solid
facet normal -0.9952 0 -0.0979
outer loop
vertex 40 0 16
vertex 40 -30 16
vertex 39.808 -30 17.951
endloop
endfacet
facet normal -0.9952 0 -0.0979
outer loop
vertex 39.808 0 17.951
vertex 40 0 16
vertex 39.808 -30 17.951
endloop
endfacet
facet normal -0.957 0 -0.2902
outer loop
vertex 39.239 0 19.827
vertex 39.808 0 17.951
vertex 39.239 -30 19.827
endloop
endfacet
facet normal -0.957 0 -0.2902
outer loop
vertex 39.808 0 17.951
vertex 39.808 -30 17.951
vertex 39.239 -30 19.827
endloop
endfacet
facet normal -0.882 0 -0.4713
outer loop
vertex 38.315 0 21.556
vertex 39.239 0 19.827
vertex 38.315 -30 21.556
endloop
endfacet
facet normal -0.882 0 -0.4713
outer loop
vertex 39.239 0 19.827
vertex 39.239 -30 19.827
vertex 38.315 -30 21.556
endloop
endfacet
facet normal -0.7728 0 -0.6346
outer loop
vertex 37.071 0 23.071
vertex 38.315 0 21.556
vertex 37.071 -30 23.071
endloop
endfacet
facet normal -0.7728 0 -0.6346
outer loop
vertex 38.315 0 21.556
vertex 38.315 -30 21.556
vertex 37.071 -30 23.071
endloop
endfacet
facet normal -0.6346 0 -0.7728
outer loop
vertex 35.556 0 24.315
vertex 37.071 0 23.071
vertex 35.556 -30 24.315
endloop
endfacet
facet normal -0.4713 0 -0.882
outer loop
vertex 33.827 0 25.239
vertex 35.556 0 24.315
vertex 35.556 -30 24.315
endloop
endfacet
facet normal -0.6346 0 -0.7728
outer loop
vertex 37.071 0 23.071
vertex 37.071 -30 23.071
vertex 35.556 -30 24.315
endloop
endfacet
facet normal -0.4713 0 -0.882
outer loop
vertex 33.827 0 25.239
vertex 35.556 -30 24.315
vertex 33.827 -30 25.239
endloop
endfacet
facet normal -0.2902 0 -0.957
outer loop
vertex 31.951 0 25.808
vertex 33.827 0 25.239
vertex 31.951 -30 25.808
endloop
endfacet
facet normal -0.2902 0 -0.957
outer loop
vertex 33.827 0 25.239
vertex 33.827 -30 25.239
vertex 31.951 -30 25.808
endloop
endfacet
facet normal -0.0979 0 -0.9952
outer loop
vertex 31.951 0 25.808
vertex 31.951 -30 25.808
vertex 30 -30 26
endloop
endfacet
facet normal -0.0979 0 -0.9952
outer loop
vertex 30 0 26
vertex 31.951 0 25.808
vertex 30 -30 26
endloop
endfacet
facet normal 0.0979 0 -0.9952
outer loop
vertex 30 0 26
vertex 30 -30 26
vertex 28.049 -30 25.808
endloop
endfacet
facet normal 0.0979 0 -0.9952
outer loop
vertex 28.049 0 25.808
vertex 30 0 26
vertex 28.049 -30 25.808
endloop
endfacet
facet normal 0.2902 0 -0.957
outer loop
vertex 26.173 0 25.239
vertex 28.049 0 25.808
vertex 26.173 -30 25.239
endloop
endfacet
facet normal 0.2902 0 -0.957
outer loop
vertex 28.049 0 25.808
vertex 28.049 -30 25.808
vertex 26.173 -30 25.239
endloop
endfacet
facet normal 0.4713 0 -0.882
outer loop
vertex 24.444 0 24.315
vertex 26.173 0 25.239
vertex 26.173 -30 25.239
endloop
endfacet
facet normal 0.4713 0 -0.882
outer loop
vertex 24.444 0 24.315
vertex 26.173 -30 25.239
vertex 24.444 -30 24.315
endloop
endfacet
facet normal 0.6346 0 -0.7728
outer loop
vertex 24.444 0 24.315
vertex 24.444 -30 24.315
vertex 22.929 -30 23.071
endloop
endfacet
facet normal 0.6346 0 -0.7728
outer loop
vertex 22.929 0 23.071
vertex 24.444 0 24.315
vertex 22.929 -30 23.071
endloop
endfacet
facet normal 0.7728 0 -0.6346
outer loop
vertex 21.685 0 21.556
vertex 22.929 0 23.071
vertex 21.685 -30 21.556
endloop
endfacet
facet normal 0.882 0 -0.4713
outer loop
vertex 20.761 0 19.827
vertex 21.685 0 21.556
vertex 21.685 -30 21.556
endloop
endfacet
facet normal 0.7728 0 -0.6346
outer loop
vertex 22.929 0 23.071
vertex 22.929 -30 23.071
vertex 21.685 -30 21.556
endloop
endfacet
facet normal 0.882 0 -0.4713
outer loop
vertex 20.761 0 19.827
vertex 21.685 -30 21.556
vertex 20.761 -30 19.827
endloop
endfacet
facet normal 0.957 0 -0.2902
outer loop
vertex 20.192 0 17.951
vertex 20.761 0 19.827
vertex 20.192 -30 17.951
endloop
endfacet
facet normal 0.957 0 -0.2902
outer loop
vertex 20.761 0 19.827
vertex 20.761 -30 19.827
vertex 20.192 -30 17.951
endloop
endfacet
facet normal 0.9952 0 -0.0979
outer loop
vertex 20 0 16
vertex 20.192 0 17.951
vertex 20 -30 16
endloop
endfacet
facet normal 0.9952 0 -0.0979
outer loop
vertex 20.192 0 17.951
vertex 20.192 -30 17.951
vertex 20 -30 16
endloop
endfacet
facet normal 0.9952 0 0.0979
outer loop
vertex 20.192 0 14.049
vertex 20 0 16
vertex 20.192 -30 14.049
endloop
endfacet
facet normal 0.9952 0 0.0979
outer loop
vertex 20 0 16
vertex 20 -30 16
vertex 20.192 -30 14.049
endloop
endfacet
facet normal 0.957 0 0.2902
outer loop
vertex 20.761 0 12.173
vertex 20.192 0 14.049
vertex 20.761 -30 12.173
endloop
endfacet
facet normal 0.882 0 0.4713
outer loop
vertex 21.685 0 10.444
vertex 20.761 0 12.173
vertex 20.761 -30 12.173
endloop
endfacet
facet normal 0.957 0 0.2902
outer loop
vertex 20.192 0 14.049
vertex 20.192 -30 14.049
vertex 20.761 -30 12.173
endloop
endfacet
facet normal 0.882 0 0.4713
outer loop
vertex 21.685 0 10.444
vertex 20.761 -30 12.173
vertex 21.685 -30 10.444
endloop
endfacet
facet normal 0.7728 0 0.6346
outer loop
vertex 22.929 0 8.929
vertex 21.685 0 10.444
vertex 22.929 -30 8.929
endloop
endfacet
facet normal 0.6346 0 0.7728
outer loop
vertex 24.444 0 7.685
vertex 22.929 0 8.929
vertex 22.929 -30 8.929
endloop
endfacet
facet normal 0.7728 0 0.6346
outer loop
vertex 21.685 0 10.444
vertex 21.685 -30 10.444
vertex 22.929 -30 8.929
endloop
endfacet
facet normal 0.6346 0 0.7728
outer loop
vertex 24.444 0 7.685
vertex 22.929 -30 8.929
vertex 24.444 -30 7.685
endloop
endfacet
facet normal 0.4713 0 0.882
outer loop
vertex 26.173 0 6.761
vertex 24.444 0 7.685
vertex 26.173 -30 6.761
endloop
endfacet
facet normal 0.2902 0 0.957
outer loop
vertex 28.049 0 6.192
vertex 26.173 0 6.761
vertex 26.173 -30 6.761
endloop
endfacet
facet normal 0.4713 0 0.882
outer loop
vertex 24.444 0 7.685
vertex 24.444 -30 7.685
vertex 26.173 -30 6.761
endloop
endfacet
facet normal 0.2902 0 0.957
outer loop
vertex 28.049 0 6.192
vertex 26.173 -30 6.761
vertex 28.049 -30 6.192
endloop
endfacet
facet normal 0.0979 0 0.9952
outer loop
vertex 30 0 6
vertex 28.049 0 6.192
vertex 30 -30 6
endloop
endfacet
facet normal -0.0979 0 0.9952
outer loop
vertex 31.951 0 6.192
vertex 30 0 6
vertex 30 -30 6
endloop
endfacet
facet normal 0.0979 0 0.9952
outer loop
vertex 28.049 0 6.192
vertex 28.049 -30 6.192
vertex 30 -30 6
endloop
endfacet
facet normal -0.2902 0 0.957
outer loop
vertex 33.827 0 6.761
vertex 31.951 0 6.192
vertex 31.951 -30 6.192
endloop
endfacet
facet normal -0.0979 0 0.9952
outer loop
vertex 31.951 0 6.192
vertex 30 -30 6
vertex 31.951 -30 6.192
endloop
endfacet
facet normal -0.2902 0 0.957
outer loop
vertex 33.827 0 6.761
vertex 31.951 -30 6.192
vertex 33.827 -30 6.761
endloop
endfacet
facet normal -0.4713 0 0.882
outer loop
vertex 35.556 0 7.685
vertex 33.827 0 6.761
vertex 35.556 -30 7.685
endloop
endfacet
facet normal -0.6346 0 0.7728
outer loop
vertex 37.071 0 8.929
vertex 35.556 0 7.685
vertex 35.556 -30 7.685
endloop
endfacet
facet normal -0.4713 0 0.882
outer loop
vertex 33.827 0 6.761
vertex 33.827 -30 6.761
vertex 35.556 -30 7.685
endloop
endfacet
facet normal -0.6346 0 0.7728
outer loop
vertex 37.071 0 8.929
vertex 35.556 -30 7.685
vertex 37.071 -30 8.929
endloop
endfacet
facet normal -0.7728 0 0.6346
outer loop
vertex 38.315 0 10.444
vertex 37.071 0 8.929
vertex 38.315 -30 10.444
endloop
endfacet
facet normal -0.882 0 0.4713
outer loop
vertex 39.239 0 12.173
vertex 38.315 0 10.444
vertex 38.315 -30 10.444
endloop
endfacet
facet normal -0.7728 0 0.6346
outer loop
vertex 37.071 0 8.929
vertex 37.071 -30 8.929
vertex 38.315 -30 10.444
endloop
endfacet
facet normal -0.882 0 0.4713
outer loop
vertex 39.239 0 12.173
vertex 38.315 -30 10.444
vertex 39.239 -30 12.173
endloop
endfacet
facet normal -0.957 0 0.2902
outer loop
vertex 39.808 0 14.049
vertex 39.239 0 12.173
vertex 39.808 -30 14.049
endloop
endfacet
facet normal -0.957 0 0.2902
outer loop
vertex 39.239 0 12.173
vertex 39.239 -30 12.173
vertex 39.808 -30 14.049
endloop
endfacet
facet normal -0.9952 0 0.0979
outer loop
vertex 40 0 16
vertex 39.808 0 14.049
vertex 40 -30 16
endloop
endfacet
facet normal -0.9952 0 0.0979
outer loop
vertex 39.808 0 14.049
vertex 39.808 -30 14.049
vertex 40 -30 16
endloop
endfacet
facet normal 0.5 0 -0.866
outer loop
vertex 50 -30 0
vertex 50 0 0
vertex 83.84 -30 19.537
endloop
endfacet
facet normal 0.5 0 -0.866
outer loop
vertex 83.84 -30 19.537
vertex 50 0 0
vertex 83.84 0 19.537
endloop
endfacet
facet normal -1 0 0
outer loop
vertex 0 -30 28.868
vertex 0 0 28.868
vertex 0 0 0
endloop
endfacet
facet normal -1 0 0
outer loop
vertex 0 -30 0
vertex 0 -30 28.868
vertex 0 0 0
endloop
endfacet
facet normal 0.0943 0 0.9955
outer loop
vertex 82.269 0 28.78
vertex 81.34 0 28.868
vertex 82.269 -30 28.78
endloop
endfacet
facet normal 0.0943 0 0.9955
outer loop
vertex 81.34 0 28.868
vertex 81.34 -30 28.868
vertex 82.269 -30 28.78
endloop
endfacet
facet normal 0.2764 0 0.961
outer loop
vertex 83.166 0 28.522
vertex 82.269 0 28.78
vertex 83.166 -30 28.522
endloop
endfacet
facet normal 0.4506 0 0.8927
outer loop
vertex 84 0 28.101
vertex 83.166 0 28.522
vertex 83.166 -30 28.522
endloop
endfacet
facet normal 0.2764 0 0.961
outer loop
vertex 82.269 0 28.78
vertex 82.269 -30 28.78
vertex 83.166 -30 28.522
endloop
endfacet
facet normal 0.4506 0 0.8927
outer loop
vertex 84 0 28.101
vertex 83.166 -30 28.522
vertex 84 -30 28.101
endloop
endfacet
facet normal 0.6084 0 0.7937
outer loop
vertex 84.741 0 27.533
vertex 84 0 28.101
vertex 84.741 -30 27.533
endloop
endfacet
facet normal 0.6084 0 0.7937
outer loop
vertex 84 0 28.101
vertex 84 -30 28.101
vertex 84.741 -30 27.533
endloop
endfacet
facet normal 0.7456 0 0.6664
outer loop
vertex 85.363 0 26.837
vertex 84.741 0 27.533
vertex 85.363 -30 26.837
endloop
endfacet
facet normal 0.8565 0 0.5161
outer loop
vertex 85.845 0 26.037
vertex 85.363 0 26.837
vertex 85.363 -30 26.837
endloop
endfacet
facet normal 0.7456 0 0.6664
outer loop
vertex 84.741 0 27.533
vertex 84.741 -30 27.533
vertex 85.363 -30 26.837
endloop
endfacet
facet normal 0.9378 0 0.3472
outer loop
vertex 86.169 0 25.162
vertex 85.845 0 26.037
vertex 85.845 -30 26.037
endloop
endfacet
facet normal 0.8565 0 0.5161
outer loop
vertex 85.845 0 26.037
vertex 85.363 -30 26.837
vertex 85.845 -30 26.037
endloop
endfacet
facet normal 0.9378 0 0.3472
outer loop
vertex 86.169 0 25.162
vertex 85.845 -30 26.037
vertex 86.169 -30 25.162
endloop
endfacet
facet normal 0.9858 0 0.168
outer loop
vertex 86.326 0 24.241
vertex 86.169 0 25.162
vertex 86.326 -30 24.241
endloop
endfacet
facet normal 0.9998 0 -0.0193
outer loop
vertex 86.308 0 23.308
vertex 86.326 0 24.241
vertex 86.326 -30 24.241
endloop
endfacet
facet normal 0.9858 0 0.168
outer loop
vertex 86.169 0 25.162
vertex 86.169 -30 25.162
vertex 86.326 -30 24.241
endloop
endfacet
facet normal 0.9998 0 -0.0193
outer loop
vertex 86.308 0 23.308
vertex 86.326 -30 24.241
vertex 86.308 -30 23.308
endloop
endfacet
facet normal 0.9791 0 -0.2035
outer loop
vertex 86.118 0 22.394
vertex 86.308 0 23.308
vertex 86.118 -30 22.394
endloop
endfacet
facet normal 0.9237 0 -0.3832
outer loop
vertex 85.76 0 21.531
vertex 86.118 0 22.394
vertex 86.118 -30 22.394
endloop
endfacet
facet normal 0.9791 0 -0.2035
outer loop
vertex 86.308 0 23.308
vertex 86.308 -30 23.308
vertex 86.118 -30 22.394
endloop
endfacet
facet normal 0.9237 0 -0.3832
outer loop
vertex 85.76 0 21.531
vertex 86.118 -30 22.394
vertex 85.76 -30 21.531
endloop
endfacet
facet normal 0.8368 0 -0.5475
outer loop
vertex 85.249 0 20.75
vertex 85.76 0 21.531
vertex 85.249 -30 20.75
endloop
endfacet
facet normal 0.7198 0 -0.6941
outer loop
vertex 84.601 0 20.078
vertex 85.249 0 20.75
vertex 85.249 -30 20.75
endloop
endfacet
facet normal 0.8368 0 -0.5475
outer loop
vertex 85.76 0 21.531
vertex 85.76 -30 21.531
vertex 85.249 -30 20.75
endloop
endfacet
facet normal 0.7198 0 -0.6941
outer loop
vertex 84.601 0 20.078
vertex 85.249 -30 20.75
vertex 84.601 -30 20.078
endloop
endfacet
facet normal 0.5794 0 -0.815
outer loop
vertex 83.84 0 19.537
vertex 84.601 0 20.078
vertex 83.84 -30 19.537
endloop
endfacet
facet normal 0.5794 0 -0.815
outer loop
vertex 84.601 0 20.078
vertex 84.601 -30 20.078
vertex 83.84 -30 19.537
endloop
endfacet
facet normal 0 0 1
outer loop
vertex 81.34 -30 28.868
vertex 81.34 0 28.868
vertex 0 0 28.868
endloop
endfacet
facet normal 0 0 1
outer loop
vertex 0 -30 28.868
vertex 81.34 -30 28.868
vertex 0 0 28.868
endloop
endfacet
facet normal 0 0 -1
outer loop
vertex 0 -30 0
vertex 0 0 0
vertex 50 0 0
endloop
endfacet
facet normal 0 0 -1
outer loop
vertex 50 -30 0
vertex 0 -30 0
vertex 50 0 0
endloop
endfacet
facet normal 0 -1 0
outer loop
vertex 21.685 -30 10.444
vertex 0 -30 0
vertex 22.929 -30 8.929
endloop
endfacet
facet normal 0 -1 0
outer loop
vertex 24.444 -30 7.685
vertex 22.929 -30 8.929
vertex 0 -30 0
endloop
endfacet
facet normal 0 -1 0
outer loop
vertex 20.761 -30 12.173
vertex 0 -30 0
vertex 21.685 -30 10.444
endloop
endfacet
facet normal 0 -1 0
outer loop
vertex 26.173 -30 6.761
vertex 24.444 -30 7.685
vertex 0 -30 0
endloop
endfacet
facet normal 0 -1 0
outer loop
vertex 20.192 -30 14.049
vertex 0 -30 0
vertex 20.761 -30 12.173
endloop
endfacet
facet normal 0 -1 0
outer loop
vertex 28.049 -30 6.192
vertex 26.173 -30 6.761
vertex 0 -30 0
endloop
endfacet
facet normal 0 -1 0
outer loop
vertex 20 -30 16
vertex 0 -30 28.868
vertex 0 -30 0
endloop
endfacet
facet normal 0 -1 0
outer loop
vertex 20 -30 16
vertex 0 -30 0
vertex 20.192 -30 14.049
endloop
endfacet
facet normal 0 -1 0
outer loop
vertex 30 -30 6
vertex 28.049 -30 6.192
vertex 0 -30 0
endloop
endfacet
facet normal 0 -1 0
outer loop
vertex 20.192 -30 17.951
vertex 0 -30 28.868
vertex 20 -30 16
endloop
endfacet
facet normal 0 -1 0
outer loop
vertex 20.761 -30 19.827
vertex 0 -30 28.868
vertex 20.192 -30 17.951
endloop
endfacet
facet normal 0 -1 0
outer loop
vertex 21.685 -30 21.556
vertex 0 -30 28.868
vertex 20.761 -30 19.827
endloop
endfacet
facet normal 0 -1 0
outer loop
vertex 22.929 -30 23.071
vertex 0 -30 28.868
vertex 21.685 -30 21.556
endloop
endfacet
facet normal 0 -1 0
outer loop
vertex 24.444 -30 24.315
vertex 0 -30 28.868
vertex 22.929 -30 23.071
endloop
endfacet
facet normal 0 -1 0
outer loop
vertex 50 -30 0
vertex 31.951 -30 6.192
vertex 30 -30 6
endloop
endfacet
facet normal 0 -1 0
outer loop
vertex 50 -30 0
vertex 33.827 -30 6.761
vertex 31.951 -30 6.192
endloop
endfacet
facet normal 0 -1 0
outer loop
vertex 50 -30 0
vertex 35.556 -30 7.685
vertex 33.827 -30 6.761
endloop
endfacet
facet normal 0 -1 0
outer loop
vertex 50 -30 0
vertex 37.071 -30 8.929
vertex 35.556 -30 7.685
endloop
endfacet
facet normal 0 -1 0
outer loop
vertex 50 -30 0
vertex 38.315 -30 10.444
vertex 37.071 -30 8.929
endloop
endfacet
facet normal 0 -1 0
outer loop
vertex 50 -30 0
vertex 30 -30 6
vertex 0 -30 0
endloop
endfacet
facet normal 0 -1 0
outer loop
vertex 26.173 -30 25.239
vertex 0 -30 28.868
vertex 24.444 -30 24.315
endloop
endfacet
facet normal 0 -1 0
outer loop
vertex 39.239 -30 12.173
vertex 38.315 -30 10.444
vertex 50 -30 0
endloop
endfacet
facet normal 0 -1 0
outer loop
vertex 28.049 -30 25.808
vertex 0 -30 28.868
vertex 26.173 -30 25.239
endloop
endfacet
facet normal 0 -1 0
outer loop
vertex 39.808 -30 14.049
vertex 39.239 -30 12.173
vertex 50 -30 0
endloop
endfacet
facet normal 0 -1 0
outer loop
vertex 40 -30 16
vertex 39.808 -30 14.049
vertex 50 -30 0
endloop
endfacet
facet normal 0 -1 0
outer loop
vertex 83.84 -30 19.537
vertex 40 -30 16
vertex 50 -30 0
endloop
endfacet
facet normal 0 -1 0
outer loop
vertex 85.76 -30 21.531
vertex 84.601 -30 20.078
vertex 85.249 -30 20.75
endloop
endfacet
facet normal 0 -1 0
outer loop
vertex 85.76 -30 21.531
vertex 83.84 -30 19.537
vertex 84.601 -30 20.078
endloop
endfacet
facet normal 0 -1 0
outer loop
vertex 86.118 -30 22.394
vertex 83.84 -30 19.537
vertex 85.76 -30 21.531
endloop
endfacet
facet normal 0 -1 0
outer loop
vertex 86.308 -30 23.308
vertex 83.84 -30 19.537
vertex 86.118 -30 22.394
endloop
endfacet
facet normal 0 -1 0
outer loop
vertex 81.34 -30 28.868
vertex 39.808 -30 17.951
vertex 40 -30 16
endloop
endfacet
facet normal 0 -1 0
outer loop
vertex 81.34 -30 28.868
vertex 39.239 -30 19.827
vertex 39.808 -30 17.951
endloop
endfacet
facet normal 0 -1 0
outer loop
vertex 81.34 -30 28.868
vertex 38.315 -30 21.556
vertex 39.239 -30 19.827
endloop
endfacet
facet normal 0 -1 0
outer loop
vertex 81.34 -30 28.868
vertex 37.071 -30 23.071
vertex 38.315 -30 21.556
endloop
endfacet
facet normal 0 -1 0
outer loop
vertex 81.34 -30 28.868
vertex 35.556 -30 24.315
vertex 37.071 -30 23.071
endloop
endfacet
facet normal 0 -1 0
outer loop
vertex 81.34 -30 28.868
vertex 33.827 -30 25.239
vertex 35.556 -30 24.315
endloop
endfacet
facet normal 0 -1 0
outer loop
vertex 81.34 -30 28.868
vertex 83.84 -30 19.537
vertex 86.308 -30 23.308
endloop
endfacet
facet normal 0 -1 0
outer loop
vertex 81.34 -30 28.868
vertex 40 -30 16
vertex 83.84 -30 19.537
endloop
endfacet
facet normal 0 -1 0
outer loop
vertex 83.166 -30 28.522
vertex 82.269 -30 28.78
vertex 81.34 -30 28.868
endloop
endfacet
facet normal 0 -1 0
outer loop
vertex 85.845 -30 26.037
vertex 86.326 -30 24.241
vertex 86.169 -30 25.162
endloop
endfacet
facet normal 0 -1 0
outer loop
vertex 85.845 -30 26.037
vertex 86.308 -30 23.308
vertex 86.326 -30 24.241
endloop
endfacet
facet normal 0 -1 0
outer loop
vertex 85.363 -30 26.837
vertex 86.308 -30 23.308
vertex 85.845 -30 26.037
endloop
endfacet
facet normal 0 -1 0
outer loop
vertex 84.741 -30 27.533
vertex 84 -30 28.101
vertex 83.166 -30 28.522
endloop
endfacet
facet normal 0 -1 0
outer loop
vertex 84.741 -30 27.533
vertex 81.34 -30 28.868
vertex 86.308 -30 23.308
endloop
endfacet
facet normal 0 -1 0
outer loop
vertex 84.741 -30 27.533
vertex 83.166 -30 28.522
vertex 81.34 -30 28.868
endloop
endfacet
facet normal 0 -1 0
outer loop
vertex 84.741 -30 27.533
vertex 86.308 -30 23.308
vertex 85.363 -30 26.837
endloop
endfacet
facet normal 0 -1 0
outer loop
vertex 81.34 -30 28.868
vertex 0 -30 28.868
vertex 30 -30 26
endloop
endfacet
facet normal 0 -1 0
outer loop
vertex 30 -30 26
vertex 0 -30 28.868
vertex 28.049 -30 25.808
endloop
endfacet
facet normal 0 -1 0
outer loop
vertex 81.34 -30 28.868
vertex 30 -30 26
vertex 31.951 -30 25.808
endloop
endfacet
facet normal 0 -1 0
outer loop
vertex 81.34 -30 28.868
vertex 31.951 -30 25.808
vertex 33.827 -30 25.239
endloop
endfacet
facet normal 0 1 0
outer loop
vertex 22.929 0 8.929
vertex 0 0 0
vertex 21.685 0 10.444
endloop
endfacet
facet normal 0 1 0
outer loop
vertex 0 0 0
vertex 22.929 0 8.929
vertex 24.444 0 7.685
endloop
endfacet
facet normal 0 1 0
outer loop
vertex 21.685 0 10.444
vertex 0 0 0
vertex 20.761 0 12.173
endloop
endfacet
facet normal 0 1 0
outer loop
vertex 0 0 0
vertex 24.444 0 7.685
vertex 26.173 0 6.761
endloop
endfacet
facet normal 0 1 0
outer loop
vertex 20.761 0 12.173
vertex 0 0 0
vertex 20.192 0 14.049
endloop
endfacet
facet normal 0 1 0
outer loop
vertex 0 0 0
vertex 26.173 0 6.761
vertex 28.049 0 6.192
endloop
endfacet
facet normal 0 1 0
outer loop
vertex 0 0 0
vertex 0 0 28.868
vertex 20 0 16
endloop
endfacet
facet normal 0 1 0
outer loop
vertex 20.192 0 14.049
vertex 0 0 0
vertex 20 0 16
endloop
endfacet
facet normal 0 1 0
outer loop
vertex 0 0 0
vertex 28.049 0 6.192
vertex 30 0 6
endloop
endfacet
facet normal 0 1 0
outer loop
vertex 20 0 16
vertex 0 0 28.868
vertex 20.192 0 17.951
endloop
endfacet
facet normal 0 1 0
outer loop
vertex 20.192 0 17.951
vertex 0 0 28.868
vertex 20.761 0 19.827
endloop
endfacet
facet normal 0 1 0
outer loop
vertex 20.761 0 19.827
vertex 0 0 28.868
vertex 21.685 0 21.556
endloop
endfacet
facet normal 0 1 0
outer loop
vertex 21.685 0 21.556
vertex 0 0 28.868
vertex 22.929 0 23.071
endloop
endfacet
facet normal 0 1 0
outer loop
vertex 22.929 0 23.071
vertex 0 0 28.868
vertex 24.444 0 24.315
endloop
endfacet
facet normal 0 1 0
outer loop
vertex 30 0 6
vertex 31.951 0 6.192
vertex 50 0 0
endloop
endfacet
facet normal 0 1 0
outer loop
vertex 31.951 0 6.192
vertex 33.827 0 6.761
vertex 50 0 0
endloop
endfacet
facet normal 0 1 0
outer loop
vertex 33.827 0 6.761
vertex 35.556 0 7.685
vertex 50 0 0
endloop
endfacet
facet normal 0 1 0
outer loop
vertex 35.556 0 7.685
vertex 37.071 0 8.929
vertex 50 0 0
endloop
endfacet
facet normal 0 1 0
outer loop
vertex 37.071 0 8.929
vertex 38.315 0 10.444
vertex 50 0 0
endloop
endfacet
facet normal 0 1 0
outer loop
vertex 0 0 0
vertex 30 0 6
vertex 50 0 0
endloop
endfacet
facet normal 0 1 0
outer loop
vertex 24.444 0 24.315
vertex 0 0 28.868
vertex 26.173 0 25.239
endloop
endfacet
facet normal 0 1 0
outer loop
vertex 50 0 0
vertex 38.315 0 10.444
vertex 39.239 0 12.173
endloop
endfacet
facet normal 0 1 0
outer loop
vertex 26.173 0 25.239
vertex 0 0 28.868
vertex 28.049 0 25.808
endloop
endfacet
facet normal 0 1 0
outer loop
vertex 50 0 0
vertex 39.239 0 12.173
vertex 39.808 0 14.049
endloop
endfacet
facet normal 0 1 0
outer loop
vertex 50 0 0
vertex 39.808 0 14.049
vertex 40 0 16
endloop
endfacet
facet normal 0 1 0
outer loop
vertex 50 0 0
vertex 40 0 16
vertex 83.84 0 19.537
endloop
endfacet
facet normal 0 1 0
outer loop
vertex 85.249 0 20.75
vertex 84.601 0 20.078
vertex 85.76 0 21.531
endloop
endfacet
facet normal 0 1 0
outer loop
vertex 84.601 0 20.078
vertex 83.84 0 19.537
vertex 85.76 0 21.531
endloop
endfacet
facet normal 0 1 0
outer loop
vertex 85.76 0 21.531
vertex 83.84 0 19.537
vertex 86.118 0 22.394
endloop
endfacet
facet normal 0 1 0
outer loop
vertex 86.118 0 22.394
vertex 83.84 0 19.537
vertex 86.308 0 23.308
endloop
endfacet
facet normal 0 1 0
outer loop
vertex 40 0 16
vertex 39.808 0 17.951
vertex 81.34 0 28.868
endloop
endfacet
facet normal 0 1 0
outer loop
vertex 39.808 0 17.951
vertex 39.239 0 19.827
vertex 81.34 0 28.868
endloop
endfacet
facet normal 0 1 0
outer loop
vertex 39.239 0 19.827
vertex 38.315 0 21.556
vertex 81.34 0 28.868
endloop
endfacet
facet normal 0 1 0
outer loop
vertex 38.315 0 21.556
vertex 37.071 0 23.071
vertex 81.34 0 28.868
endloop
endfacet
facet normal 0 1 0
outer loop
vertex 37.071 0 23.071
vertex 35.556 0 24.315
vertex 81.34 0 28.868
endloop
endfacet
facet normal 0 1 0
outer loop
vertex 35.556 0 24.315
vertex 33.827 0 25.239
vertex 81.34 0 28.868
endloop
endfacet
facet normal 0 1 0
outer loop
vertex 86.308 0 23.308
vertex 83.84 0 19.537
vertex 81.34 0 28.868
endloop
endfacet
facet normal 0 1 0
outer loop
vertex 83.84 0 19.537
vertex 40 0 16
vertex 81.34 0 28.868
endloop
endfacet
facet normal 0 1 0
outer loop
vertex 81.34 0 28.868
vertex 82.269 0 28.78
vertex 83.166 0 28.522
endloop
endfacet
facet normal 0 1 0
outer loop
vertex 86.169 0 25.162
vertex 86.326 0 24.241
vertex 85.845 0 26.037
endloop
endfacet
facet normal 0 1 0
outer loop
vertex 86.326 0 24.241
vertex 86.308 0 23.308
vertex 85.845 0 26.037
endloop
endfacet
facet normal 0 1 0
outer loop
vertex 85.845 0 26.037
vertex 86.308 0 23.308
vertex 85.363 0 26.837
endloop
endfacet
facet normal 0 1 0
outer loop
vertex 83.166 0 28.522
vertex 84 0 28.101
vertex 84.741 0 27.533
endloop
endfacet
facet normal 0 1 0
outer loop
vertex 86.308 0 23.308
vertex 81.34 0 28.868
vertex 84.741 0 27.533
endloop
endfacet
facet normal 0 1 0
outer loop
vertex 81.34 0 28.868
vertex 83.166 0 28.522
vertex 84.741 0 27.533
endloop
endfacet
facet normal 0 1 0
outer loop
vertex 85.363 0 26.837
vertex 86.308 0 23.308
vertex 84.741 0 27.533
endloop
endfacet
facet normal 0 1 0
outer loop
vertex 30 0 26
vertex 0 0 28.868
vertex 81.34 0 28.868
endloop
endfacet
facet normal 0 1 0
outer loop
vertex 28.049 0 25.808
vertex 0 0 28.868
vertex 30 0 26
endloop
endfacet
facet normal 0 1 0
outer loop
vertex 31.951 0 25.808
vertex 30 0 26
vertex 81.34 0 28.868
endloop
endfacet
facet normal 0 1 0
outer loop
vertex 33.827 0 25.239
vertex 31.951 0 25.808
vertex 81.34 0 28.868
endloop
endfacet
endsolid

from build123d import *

# Parameters (mm, degrees)
F1_DEPTH = 30
F2_R     = 10
F3_DEPTH = 30
F4_R     = 5


with BuildPart() as f1:
    # F0 (on Front) → F1 (new body)
    with BuildSketch(Plane.XZ):
        Polygon((0, 28.867513), (0, 0), (50, 0), (100, 28.867513), align=None)
    extrude(amount=F1_DEPTH)

    # F2 (on face) → F3 (cut, through all)
    with BuildSketch(Plane.XZ.offset(30)):
        with Locations((30, 16)):
            Circle(F2_R)
    extrude(amount=-F3_DEPTH, mode=Mode.SUBTRACT)

    # F4
    f4_edges = [f1.edges().sort_by_distance(p)[0] for p in [
        (100, -15, 28.867513),
    ]]
    fillet(f4_edges, radius=F4_R)


solid = f1.part
